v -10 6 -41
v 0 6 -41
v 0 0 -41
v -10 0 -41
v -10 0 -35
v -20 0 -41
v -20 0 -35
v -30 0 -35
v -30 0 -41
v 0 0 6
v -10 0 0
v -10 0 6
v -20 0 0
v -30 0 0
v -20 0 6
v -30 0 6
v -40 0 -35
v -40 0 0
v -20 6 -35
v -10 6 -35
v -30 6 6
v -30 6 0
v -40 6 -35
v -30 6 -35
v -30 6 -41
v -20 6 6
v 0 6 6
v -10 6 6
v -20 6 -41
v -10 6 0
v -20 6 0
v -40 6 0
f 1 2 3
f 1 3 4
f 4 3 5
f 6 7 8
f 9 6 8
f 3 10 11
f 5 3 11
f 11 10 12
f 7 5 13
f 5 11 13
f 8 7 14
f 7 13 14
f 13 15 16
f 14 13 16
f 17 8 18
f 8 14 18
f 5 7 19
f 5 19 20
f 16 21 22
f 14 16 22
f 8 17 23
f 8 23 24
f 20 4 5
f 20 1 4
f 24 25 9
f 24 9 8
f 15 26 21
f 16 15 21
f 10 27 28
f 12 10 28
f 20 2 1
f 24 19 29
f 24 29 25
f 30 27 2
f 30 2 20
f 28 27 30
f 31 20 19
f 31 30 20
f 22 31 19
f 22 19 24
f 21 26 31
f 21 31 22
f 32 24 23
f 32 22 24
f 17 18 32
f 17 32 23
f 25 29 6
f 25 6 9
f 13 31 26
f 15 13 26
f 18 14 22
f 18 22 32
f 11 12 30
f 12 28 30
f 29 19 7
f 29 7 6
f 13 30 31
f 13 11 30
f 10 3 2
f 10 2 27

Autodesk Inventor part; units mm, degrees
ref_plane "YZ Plane" through (0, 0, 0) normal (1, 0, 0) x (0, 1, 0)
ref_plane "XZ Plane" through (0, 0, 0) normal (0, 1, 0) x (-1, 0, 0)
ref_plane "XY Plane" through (0, 0, 0) normal (0, 0, 1) x (1, 0, 0)
sketch "Sketch1" plane through (0, 0, 0) normal (0, 1, 0) x (-1, 0, 0)
  line L0 (0, 0) -> (40, 0)
  line L1 (40, 0) -> (40, -35)
  line L2 (40, -35) -> (0, -35)
  line L3 (0, -35) -> (0, 0)
  dimension "d0" = 40
  dimension "d1" = 35
extrude "Extrusion1" add sketch "Sketch1" along normal blind 6
sketch "Sketch2" plane through (0, 6, 0) normal (0, 1, 0) x (1, 0, 0)
  line L0 (-40, 35) -> (-40, 0) projected
  line L1 (-40, 0) -> (-30, 0)
  line L2 (-40, 0) -> (0, 0) projected
  line L3 (-30, 0) -> (-20, 0)
  line L4 (-20, 0) -> (-20, -6)
  line L5 (-20, -6) -> (-30, -6)
  line L6 (-30, -6) -> (-30, 0)
  line L7 (-30, 35) -> (-20, 35)
  line L8 (-20, 35) -> (-20, 41)
  line L9 (-20, 41) -> (-30, 41)
  line L10 (-30, 41) -> (-30, 35)
  dimension "d4" = 10
  dimension "d5" = 10
  dimension "d6" = 6
  dimension "d7" = 10
  dimension "d8" = 6
extrude "Extrusion2" add sketch "Sketch2" against normal blind 6
pattern_linear "Rectangular Pattern1" count 2 spacing 20 along (1, 0, 0) of "Extrusion2"
properties part number "e_arm holder 1"
